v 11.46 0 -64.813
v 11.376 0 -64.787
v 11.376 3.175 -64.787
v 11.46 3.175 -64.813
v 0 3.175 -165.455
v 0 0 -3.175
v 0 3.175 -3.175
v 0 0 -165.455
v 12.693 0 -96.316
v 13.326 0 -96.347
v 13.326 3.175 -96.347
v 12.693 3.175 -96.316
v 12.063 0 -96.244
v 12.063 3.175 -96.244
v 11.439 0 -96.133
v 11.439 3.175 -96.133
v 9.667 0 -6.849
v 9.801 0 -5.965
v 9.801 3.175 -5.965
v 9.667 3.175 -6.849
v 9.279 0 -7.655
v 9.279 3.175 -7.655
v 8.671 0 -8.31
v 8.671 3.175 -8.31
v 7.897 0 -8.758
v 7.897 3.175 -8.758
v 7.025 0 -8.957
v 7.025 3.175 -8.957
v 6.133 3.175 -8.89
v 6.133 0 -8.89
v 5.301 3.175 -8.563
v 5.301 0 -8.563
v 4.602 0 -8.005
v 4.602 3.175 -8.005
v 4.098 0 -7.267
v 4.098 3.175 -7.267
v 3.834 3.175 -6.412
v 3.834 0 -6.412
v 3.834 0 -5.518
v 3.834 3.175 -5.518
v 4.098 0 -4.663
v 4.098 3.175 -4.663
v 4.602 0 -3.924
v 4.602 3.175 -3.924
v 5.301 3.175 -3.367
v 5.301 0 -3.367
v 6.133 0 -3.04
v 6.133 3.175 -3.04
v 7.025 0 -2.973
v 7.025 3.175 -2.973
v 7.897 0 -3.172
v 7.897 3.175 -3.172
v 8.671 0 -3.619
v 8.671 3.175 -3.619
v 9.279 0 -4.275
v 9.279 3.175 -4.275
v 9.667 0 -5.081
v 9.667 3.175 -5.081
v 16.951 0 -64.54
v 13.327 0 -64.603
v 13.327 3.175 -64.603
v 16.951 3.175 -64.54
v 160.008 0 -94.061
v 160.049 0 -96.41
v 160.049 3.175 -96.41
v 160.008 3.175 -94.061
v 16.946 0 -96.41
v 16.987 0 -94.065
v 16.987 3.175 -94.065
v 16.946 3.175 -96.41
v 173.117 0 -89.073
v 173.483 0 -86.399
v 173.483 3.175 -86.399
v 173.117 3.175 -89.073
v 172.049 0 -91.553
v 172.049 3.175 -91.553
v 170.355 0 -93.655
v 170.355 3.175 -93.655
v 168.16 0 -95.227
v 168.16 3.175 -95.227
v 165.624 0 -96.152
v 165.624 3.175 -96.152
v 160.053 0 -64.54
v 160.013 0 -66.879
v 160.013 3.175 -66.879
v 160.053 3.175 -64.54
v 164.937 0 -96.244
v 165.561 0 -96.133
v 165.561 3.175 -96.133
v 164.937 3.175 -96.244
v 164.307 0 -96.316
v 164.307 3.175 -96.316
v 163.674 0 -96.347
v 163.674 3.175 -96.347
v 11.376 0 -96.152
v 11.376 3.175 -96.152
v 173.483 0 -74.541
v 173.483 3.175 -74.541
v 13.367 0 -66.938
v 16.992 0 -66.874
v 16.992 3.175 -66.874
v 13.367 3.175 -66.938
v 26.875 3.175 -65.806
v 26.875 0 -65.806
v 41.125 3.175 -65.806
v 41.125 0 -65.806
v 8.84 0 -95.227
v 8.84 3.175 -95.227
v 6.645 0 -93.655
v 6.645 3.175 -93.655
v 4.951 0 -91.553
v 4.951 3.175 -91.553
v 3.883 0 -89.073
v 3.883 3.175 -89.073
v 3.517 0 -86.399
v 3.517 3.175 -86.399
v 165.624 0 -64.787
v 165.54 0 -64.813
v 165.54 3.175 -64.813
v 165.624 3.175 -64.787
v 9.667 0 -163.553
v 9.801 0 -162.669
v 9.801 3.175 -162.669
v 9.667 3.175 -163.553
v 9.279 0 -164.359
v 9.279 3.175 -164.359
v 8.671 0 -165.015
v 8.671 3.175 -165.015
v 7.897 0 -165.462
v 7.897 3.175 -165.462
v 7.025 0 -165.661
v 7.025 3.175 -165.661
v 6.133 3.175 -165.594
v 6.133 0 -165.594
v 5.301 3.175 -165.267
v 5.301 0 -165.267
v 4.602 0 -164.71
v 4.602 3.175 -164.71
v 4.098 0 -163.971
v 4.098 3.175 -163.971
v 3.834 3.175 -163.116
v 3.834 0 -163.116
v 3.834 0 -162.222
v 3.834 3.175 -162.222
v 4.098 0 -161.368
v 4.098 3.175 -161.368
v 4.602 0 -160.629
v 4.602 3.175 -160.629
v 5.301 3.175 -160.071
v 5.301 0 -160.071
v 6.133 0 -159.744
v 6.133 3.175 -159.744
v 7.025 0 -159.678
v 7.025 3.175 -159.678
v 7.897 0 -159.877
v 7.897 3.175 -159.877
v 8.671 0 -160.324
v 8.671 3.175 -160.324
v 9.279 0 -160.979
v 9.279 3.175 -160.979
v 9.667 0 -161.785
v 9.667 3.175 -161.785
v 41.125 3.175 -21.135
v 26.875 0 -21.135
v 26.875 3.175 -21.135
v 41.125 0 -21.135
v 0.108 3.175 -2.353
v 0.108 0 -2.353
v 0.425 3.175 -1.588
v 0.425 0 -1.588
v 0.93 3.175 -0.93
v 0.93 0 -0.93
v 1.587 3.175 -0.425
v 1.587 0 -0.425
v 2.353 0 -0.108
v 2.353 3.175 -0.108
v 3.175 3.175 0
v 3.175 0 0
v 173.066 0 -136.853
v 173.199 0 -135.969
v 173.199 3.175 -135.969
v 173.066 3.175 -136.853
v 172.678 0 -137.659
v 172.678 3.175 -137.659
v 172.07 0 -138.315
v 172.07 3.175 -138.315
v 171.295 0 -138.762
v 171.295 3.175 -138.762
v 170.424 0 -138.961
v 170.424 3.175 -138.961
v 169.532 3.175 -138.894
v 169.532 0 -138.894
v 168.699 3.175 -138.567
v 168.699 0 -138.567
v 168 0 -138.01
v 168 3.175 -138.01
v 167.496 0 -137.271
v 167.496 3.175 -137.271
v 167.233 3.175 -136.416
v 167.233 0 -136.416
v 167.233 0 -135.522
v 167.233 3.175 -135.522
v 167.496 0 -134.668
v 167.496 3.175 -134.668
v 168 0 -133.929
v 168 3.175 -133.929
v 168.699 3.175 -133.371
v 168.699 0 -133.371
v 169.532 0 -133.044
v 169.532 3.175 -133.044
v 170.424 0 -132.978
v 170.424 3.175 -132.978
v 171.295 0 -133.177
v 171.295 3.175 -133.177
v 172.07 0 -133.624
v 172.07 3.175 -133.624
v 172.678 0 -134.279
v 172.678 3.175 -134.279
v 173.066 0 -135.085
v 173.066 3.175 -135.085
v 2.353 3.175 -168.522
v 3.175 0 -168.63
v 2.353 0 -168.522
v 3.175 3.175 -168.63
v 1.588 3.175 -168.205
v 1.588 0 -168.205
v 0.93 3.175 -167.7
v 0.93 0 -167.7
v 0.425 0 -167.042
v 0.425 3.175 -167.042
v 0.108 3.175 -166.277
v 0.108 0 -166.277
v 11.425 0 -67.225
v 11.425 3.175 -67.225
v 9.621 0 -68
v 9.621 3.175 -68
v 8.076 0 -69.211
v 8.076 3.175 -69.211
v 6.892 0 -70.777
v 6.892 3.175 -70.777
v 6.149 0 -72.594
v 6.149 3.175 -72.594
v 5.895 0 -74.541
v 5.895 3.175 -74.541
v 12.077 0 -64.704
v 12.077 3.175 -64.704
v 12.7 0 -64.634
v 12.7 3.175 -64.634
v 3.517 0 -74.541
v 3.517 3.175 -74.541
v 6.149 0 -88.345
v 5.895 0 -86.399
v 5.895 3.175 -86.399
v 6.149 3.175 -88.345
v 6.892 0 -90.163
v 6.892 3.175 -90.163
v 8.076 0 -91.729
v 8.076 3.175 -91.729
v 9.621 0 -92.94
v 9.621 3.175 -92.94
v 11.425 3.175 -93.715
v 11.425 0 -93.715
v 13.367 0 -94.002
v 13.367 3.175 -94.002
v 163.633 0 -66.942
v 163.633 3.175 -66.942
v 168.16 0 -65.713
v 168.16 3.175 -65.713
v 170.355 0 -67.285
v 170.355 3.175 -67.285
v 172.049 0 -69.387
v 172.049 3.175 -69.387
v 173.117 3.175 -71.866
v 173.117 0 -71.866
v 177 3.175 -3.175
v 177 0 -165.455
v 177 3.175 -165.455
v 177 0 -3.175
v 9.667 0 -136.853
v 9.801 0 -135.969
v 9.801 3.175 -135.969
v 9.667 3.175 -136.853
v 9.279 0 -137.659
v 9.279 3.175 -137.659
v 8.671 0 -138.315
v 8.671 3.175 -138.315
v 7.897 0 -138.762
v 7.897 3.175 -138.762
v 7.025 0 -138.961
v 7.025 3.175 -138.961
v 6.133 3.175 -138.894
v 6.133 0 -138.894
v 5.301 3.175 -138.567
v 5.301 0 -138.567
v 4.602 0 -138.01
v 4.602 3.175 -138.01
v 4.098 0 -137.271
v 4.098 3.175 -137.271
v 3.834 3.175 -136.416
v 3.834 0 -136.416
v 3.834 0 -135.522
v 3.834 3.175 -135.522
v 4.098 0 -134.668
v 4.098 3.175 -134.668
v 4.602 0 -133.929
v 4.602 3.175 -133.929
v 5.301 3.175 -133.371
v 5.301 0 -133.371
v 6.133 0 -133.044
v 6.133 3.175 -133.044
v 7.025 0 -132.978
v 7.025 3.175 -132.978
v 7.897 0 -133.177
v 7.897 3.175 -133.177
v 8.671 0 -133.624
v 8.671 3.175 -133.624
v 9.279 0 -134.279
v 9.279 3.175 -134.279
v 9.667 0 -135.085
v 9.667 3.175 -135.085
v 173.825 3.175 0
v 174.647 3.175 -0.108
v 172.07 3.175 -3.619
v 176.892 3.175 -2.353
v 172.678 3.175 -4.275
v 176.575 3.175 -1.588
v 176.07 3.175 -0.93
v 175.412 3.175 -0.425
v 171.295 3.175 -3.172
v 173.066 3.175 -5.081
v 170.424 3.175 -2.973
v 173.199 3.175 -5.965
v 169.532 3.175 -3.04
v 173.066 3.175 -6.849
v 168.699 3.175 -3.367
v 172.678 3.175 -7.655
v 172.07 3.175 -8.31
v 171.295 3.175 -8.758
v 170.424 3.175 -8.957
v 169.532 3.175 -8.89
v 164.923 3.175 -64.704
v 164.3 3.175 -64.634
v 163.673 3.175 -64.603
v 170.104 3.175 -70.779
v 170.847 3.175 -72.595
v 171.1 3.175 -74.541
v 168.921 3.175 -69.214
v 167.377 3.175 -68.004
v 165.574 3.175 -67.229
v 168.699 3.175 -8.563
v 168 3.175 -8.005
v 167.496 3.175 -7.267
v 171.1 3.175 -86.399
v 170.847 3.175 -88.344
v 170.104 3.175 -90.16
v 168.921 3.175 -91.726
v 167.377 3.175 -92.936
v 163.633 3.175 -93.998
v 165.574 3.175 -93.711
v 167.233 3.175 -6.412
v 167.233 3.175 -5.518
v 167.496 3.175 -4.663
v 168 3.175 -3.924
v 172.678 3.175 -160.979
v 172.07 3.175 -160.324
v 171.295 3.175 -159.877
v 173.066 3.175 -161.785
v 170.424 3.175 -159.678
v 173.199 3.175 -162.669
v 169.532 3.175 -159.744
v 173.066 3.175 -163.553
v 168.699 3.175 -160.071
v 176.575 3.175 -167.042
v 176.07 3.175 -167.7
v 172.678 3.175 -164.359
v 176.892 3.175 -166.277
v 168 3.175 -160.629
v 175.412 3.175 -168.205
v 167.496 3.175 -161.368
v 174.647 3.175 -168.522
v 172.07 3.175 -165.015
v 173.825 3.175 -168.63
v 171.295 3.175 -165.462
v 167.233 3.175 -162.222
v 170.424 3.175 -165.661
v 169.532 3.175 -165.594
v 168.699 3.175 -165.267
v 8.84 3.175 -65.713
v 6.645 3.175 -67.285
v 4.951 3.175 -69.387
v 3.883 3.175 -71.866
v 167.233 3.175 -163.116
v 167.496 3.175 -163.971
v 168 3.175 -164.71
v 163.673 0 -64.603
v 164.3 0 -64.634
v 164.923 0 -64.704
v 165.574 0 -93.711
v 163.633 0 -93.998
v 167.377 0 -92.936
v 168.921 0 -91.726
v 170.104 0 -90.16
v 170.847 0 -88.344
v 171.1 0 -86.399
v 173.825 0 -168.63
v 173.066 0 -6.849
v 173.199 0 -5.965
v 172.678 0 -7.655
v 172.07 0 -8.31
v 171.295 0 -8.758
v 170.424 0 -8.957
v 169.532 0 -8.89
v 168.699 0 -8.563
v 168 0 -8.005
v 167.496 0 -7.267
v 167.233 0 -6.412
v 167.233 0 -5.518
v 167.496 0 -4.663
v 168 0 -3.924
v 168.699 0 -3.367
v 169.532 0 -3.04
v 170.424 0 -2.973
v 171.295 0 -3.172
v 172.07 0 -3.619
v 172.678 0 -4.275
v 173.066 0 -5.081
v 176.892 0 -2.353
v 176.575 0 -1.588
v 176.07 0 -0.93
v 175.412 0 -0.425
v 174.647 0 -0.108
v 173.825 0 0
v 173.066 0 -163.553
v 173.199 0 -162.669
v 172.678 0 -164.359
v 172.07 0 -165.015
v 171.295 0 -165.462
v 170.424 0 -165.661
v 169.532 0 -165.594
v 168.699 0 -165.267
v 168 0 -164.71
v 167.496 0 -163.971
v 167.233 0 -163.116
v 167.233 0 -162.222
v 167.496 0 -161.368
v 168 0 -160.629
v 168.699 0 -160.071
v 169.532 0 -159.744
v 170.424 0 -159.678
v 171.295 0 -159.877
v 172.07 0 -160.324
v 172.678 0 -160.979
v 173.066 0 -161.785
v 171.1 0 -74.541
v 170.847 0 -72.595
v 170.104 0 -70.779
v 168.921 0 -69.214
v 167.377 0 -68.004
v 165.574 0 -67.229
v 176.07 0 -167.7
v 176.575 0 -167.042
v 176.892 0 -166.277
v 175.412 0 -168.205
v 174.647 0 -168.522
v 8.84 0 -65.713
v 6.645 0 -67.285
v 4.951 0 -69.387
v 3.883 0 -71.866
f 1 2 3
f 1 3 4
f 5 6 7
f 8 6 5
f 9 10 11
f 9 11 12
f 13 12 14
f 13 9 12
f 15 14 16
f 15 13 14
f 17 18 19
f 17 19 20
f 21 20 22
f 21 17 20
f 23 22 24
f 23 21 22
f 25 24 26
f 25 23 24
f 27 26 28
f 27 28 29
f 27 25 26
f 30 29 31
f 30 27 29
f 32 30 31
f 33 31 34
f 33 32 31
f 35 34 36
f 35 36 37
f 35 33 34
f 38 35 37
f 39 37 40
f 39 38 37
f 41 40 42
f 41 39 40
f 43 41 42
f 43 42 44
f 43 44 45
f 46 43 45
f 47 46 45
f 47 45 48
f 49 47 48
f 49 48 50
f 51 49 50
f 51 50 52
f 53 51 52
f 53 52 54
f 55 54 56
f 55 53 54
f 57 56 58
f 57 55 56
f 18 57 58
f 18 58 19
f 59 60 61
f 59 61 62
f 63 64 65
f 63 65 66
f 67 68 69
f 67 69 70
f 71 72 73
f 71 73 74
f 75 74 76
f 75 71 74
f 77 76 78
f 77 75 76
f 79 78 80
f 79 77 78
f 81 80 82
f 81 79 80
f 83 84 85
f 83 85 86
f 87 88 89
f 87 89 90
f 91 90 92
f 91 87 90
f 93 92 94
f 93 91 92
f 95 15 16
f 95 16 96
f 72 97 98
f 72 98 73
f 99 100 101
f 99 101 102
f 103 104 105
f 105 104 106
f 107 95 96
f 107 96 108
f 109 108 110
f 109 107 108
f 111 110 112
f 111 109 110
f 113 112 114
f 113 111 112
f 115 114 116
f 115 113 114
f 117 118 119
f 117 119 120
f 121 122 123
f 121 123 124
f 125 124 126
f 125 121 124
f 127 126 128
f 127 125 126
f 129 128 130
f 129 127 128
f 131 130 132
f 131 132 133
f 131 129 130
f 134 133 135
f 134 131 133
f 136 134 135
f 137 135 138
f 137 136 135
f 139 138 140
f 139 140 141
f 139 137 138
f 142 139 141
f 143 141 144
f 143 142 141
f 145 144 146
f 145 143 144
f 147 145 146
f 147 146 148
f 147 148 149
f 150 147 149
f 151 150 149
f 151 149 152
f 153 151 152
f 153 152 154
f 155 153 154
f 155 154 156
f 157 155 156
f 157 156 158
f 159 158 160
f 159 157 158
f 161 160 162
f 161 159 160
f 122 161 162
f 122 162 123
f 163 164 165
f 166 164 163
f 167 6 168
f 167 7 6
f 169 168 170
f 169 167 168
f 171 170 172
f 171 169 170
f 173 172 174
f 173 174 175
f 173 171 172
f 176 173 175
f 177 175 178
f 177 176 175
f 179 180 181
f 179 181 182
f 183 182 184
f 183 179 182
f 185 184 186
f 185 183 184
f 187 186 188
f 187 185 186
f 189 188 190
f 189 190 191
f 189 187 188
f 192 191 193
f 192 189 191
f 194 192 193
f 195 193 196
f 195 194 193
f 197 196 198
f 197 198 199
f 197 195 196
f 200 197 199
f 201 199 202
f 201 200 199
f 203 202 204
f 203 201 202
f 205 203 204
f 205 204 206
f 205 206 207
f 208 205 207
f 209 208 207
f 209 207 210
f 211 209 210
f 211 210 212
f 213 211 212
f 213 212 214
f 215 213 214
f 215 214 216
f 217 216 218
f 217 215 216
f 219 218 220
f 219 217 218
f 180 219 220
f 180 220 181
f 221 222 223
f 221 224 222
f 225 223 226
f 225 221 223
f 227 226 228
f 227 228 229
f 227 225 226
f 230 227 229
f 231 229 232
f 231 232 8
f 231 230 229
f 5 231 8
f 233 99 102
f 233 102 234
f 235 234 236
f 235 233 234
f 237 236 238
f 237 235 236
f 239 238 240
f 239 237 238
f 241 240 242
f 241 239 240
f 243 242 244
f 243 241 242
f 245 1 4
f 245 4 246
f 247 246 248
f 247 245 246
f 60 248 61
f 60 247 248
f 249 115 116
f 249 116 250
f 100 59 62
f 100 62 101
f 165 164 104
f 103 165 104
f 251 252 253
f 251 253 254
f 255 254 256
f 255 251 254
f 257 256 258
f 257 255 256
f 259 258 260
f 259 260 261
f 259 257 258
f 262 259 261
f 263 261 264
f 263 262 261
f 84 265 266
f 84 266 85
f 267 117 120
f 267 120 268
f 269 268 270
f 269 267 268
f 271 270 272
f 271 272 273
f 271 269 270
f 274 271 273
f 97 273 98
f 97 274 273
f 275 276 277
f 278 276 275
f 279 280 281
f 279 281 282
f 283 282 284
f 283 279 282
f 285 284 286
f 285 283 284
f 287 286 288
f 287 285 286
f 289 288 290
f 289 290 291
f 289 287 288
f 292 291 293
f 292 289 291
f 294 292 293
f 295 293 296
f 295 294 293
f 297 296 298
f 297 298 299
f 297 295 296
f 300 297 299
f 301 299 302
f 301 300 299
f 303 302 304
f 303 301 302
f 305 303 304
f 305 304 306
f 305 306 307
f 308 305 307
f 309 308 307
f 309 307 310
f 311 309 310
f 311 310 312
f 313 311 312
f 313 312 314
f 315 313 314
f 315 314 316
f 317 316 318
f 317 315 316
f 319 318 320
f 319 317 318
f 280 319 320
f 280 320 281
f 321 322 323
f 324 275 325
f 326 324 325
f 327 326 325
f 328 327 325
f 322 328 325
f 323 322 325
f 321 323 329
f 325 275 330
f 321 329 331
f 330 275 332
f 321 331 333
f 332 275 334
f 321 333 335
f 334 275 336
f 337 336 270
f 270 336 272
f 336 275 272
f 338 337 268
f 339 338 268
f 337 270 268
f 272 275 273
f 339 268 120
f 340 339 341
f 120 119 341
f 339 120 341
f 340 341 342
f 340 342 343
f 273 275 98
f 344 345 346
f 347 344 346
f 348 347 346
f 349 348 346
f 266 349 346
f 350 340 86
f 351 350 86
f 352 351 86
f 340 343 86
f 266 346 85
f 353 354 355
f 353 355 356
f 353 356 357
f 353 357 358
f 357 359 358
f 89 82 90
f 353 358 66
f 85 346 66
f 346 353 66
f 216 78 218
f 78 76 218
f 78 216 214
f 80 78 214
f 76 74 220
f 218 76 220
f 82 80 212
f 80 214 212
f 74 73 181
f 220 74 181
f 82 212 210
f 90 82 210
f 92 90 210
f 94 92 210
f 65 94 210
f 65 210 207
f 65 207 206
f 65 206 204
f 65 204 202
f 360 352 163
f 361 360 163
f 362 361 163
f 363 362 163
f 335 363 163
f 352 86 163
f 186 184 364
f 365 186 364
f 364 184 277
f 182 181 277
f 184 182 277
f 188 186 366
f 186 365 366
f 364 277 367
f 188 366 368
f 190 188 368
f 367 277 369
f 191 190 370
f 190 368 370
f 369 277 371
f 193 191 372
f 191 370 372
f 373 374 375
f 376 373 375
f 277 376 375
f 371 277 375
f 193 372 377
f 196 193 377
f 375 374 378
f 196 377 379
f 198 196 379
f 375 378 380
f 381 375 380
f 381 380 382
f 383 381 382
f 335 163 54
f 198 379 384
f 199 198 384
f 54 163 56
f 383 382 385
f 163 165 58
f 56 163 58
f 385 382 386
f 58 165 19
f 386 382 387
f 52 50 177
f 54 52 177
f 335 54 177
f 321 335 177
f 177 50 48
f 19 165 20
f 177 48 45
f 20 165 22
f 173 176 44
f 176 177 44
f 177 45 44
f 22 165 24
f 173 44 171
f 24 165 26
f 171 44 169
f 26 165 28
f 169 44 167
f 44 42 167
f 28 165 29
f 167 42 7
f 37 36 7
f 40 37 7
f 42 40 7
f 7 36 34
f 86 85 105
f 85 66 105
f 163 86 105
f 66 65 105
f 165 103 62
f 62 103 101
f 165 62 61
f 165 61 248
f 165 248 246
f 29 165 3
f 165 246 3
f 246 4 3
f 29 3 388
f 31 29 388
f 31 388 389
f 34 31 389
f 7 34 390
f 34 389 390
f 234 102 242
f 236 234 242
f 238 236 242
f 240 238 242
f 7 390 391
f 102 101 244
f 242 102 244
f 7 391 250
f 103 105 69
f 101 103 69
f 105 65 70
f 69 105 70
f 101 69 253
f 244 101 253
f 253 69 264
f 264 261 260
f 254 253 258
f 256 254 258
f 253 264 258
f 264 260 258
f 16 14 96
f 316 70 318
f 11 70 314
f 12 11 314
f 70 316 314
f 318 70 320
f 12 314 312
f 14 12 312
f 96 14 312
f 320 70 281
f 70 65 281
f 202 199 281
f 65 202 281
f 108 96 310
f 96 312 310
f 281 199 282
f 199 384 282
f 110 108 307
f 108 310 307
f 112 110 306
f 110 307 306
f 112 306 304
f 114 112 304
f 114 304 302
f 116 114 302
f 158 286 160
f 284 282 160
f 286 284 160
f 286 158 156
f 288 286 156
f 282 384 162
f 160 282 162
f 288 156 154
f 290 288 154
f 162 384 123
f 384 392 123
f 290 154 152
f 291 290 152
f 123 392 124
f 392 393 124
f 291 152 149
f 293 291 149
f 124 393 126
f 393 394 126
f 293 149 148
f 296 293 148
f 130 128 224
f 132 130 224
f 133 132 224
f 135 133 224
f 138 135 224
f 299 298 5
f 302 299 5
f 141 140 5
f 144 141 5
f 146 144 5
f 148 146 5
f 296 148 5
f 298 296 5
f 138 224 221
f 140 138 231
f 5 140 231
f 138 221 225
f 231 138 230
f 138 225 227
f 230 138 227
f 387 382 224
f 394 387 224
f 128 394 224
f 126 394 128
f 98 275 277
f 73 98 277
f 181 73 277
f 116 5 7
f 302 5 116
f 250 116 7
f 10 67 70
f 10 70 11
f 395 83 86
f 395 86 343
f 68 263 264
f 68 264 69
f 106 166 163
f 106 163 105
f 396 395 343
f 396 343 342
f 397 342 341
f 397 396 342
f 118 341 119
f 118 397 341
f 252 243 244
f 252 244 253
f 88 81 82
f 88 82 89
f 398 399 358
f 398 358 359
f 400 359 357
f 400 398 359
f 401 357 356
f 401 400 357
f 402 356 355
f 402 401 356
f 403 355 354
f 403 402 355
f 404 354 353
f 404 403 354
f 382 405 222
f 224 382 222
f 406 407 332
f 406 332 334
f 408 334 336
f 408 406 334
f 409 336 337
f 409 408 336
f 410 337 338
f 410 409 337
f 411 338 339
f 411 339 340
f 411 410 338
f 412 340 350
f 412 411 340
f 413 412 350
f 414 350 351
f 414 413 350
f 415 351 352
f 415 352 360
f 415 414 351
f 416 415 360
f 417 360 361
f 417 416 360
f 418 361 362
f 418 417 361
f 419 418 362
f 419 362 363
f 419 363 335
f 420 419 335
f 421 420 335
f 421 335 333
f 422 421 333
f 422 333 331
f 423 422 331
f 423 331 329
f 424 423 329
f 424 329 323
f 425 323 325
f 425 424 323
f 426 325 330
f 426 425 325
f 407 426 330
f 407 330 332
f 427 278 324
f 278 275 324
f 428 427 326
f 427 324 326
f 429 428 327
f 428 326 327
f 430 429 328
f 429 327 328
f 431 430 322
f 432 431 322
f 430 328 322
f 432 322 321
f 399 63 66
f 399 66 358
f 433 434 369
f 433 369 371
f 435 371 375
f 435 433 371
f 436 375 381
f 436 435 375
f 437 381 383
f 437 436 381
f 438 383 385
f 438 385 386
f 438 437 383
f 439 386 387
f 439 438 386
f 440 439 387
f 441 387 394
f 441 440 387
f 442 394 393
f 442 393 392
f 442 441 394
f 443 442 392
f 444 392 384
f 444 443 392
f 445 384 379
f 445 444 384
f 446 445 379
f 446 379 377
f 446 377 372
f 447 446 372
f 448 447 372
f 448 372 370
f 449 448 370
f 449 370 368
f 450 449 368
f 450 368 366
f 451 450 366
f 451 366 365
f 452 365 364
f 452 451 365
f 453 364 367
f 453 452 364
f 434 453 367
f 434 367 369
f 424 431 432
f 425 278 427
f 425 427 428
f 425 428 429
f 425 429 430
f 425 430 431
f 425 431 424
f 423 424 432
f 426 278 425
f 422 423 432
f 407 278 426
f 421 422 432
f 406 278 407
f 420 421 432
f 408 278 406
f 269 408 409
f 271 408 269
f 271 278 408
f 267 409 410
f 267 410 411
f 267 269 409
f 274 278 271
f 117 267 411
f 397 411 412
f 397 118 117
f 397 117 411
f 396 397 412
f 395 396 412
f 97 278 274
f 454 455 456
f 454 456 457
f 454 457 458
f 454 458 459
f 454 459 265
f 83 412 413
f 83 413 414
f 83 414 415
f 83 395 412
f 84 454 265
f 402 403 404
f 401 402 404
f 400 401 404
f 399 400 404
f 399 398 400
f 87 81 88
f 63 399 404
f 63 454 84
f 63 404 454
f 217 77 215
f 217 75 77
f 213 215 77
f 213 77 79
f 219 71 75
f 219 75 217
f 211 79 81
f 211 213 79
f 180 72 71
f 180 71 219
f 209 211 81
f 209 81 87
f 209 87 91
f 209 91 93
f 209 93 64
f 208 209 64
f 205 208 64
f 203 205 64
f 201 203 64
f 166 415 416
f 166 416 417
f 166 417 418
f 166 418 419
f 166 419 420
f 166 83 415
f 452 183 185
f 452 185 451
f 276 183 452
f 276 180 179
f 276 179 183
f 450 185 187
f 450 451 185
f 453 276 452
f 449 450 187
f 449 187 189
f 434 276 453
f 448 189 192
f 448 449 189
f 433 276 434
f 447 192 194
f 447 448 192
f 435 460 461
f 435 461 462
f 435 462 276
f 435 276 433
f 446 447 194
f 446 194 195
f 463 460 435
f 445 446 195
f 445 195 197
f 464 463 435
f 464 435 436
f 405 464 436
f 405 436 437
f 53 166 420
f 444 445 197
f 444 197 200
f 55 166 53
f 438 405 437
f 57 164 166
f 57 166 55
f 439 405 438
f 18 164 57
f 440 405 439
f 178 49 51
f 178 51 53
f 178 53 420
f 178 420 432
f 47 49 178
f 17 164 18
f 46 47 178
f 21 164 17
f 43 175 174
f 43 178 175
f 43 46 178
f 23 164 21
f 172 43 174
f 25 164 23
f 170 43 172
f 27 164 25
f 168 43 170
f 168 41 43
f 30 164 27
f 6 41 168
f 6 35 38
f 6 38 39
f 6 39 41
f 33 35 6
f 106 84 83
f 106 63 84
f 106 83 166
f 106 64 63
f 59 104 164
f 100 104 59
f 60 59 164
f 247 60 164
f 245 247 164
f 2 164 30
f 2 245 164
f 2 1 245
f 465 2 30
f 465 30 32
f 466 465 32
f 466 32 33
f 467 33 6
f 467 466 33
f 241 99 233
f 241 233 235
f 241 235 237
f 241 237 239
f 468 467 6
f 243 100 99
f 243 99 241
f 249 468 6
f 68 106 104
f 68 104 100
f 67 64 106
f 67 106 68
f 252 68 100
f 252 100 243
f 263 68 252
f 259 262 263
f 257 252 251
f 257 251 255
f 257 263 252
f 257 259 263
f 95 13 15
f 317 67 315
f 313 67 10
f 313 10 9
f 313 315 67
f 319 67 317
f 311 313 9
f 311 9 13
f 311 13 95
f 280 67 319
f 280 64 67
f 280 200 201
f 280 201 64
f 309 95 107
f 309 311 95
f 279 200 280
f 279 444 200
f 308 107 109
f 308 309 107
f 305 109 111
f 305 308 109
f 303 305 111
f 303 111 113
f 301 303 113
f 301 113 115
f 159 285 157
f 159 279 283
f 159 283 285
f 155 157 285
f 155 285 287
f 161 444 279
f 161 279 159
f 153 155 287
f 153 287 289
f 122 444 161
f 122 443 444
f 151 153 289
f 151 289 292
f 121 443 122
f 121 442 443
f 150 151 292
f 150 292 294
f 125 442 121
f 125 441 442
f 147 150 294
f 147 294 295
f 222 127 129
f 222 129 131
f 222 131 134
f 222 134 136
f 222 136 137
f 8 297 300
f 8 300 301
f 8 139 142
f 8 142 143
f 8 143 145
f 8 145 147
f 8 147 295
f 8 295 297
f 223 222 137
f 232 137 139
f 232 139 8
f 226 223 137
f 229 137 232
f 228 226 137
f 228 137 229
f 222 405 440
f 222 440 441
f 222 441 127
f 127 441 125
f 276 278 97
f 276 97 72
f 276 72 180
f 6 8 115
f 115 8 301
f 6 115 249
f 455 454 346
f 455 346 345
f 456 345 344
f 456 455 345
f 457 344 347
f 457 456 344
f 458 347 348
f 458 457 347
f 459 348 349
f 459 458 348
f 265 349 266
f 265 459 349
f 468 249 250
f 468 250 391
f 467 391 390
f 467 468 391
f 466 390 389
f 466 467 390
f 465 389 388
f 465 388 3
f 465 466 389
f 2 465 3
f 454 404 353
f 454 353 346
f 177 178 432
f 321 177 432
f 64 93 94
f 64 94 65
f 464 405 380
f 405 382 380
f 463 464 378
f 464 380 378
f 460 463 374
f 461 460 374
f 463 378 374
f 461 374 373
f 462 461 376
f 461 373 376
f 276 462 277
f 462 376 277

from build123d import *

# Parameters (mm, degrees)
SKETCH1_R           = 3
SKETCH1_W           = 14.2494
SKETCH1_H           = 44.671382498
BOSS_EXTRUDE1_DEPTH = 3.175
FILLET1_R           = 3.175


with BuildPart() as part:
    # Sketch1 → Boss-Extrude1 (new body)
    with BuildSketch(Plane(origin=(0, 0, 0), x_dir=(1, 0, 0), z_dir=(0, 1, 0))):
        Polygon((16.960672162, 168.629876359), (160.039327838, 168.629876359), (177, 168.629876359), (177, 0), (160.039327838, 0), (16.960672162, 0), (0, 0), (0, 168.629876359), align=None)
        with Locations((6.800672162, 162.669204197)):
            Circle(SKETCH1_R, mode=Mode.SUBTRACT)
        with Locations((6.800672162, 135.969204197)):
            Circle(SKETCH1_R, mode=Mode.SUBTRACT)
        with Locations((170.199327838, 162.669204197)):
            Circle(SKETCH1_R, mode=Mode.SUBTRACT)
        with Locations((170.199327838, 135.969204197)):
            Circle(SKETCH1_R, mode=Mode.SUBTRACT)
        with Locations((6.800672162, 5.96493818)):
            Circle(SKETCH1_R, mode=Mode.SUBTRACT)
        with Locations((170.199327838, 5.96493818)):
            Circle(SKETCH1_R, mode=Mode.SUBTRACT)
        with Locations((34, 43.470295491)):
            Rectangle(SKETCH1_W, SKETCH1_H, mode=Mode.SUBTRACT)
        with BuildLine():
            Line((16.951048024, 64.540050733), (16.991793389, 66.874351095))
            Line((16.991793389, 66.874351095), (13.367278288, 66.937617241))
            ThreePointArc((13.367278288, 66.937617241), (8.075887225, 69.210978252), (5.895219965, 74.541239031))
            Line((5.895219965, 74.541239031), (5.895219965, 86.398551951))
            ThreePointArc((5.895219965, 86.398551951), (8.075887225, 91.72881273), (13.367278288, 94.00217374))
            Line((13.367278288, 94.00217374), (16.987373531, 94.065362738))
            Line((16.987373531, 94.065362738), (16.946445409, 96.410133308))
            Line((16.946445409, 96.410133308), (13.326350165, 96.34694431))
            ThreePointArc((13.326350165, 96.34694431), (12.377781101, 96.284971401), (11.439455037, 96.132760663))
            Line((11.439455037, 96.132760663), (11.375913148, 96.152499099))
            ThreePointArc((11.375913148, 96.152499099), (5.72648647, 92.661436057), (3.517453736, 86.398551951))
            Line((3.517453736, 86.398551951), (3.517453736, 74.541239031))
            ThreePointArc((3.517453736, 74.541239031), (5.726486031, 68.278355625), (11.375911736, 64.787292544))
            Line((11.375911736, 64.787292544), (11.459759836, 64.8134536))
            ThreePointArc((11.459759836, 64.8134536), (12.38817048, 64.664183621), (13.326532399, 64.603316889))
            Line((13.326532399, 64.603316889), (16.951048024, 64.540050733))
        make_face(mode=Mode.SUBTRACT)
        with BuildLine():
            Line((160.012549311, 66.878848625), (160.053371832, 64.540127941))
            Line((160.053371832, 64.540127941), (163.673466588, 64.60331693))
            ThreePointArc((163.673466588, 64.60331693), (164.611836733, 64.664184588), (165.540255354, 64.81345704))
            Line((165.540255354, 64.81345704), (165.624086371, 64.787291495))
            ThreePointArc((165.624086371, 64.787291495), (171.273513049, 68.278354537), (173.482545784, 74.541238643))
            Line((173.482545784, 74.541238643), (173.482545784, 86.398551563))
            ThreePointArc((173.482545784, 86.398551563), (171.273513446, 92.661435036), (165.624087648, 96.152498114))
            Line((165.624087648, 96.152498114), (165.560531376, 96.132763539))
            ThreePointArc((165.560531376, 96.132763539), (164.622211999, 96.284972184), (163.673649835, 96.34694431))
            Line((163.673649835, 96.34694431), (160.04913421, 96.410210466))
            Line((160.04913421, 96.410210466), (160.008128929, 94.061019514))
            Line((160.008128929, 94.061019514), (163.632644554, 93.997753359))
            ThreePointArc((163.632644554, 93.997753359), (168.920959456, 91.725713971), (171.10035898, 86.398551951))
            Line((171.10035898, 86.398551951), (171.10035898, 74.541239031))
            ThreePointArc((171.10035898, 74.541239031), (168.920959456, 69.21407701), (163.632644554, 66.942037623))
            Line((163.632644554, 66.942037623), (160.012549311, 66.878848625))
        make_face(mode=Mode.SUBTRACT)
    extrude(amount=BOSS_EXTRUDE1_DEPTH)

    # Fillet1
    fillet1_edges = [part.edges().sort_by_distance(p)[0] for p in [
        (0, 1.5875, 0),
        (0, 1.5875, -168.629876359),
        (177, 1.5875, -168.629876359),
        (177, 1.5875, 0),
    ]]
    fillet(fillet1_edges, radius=FILLET1_R)


solid = part.part
